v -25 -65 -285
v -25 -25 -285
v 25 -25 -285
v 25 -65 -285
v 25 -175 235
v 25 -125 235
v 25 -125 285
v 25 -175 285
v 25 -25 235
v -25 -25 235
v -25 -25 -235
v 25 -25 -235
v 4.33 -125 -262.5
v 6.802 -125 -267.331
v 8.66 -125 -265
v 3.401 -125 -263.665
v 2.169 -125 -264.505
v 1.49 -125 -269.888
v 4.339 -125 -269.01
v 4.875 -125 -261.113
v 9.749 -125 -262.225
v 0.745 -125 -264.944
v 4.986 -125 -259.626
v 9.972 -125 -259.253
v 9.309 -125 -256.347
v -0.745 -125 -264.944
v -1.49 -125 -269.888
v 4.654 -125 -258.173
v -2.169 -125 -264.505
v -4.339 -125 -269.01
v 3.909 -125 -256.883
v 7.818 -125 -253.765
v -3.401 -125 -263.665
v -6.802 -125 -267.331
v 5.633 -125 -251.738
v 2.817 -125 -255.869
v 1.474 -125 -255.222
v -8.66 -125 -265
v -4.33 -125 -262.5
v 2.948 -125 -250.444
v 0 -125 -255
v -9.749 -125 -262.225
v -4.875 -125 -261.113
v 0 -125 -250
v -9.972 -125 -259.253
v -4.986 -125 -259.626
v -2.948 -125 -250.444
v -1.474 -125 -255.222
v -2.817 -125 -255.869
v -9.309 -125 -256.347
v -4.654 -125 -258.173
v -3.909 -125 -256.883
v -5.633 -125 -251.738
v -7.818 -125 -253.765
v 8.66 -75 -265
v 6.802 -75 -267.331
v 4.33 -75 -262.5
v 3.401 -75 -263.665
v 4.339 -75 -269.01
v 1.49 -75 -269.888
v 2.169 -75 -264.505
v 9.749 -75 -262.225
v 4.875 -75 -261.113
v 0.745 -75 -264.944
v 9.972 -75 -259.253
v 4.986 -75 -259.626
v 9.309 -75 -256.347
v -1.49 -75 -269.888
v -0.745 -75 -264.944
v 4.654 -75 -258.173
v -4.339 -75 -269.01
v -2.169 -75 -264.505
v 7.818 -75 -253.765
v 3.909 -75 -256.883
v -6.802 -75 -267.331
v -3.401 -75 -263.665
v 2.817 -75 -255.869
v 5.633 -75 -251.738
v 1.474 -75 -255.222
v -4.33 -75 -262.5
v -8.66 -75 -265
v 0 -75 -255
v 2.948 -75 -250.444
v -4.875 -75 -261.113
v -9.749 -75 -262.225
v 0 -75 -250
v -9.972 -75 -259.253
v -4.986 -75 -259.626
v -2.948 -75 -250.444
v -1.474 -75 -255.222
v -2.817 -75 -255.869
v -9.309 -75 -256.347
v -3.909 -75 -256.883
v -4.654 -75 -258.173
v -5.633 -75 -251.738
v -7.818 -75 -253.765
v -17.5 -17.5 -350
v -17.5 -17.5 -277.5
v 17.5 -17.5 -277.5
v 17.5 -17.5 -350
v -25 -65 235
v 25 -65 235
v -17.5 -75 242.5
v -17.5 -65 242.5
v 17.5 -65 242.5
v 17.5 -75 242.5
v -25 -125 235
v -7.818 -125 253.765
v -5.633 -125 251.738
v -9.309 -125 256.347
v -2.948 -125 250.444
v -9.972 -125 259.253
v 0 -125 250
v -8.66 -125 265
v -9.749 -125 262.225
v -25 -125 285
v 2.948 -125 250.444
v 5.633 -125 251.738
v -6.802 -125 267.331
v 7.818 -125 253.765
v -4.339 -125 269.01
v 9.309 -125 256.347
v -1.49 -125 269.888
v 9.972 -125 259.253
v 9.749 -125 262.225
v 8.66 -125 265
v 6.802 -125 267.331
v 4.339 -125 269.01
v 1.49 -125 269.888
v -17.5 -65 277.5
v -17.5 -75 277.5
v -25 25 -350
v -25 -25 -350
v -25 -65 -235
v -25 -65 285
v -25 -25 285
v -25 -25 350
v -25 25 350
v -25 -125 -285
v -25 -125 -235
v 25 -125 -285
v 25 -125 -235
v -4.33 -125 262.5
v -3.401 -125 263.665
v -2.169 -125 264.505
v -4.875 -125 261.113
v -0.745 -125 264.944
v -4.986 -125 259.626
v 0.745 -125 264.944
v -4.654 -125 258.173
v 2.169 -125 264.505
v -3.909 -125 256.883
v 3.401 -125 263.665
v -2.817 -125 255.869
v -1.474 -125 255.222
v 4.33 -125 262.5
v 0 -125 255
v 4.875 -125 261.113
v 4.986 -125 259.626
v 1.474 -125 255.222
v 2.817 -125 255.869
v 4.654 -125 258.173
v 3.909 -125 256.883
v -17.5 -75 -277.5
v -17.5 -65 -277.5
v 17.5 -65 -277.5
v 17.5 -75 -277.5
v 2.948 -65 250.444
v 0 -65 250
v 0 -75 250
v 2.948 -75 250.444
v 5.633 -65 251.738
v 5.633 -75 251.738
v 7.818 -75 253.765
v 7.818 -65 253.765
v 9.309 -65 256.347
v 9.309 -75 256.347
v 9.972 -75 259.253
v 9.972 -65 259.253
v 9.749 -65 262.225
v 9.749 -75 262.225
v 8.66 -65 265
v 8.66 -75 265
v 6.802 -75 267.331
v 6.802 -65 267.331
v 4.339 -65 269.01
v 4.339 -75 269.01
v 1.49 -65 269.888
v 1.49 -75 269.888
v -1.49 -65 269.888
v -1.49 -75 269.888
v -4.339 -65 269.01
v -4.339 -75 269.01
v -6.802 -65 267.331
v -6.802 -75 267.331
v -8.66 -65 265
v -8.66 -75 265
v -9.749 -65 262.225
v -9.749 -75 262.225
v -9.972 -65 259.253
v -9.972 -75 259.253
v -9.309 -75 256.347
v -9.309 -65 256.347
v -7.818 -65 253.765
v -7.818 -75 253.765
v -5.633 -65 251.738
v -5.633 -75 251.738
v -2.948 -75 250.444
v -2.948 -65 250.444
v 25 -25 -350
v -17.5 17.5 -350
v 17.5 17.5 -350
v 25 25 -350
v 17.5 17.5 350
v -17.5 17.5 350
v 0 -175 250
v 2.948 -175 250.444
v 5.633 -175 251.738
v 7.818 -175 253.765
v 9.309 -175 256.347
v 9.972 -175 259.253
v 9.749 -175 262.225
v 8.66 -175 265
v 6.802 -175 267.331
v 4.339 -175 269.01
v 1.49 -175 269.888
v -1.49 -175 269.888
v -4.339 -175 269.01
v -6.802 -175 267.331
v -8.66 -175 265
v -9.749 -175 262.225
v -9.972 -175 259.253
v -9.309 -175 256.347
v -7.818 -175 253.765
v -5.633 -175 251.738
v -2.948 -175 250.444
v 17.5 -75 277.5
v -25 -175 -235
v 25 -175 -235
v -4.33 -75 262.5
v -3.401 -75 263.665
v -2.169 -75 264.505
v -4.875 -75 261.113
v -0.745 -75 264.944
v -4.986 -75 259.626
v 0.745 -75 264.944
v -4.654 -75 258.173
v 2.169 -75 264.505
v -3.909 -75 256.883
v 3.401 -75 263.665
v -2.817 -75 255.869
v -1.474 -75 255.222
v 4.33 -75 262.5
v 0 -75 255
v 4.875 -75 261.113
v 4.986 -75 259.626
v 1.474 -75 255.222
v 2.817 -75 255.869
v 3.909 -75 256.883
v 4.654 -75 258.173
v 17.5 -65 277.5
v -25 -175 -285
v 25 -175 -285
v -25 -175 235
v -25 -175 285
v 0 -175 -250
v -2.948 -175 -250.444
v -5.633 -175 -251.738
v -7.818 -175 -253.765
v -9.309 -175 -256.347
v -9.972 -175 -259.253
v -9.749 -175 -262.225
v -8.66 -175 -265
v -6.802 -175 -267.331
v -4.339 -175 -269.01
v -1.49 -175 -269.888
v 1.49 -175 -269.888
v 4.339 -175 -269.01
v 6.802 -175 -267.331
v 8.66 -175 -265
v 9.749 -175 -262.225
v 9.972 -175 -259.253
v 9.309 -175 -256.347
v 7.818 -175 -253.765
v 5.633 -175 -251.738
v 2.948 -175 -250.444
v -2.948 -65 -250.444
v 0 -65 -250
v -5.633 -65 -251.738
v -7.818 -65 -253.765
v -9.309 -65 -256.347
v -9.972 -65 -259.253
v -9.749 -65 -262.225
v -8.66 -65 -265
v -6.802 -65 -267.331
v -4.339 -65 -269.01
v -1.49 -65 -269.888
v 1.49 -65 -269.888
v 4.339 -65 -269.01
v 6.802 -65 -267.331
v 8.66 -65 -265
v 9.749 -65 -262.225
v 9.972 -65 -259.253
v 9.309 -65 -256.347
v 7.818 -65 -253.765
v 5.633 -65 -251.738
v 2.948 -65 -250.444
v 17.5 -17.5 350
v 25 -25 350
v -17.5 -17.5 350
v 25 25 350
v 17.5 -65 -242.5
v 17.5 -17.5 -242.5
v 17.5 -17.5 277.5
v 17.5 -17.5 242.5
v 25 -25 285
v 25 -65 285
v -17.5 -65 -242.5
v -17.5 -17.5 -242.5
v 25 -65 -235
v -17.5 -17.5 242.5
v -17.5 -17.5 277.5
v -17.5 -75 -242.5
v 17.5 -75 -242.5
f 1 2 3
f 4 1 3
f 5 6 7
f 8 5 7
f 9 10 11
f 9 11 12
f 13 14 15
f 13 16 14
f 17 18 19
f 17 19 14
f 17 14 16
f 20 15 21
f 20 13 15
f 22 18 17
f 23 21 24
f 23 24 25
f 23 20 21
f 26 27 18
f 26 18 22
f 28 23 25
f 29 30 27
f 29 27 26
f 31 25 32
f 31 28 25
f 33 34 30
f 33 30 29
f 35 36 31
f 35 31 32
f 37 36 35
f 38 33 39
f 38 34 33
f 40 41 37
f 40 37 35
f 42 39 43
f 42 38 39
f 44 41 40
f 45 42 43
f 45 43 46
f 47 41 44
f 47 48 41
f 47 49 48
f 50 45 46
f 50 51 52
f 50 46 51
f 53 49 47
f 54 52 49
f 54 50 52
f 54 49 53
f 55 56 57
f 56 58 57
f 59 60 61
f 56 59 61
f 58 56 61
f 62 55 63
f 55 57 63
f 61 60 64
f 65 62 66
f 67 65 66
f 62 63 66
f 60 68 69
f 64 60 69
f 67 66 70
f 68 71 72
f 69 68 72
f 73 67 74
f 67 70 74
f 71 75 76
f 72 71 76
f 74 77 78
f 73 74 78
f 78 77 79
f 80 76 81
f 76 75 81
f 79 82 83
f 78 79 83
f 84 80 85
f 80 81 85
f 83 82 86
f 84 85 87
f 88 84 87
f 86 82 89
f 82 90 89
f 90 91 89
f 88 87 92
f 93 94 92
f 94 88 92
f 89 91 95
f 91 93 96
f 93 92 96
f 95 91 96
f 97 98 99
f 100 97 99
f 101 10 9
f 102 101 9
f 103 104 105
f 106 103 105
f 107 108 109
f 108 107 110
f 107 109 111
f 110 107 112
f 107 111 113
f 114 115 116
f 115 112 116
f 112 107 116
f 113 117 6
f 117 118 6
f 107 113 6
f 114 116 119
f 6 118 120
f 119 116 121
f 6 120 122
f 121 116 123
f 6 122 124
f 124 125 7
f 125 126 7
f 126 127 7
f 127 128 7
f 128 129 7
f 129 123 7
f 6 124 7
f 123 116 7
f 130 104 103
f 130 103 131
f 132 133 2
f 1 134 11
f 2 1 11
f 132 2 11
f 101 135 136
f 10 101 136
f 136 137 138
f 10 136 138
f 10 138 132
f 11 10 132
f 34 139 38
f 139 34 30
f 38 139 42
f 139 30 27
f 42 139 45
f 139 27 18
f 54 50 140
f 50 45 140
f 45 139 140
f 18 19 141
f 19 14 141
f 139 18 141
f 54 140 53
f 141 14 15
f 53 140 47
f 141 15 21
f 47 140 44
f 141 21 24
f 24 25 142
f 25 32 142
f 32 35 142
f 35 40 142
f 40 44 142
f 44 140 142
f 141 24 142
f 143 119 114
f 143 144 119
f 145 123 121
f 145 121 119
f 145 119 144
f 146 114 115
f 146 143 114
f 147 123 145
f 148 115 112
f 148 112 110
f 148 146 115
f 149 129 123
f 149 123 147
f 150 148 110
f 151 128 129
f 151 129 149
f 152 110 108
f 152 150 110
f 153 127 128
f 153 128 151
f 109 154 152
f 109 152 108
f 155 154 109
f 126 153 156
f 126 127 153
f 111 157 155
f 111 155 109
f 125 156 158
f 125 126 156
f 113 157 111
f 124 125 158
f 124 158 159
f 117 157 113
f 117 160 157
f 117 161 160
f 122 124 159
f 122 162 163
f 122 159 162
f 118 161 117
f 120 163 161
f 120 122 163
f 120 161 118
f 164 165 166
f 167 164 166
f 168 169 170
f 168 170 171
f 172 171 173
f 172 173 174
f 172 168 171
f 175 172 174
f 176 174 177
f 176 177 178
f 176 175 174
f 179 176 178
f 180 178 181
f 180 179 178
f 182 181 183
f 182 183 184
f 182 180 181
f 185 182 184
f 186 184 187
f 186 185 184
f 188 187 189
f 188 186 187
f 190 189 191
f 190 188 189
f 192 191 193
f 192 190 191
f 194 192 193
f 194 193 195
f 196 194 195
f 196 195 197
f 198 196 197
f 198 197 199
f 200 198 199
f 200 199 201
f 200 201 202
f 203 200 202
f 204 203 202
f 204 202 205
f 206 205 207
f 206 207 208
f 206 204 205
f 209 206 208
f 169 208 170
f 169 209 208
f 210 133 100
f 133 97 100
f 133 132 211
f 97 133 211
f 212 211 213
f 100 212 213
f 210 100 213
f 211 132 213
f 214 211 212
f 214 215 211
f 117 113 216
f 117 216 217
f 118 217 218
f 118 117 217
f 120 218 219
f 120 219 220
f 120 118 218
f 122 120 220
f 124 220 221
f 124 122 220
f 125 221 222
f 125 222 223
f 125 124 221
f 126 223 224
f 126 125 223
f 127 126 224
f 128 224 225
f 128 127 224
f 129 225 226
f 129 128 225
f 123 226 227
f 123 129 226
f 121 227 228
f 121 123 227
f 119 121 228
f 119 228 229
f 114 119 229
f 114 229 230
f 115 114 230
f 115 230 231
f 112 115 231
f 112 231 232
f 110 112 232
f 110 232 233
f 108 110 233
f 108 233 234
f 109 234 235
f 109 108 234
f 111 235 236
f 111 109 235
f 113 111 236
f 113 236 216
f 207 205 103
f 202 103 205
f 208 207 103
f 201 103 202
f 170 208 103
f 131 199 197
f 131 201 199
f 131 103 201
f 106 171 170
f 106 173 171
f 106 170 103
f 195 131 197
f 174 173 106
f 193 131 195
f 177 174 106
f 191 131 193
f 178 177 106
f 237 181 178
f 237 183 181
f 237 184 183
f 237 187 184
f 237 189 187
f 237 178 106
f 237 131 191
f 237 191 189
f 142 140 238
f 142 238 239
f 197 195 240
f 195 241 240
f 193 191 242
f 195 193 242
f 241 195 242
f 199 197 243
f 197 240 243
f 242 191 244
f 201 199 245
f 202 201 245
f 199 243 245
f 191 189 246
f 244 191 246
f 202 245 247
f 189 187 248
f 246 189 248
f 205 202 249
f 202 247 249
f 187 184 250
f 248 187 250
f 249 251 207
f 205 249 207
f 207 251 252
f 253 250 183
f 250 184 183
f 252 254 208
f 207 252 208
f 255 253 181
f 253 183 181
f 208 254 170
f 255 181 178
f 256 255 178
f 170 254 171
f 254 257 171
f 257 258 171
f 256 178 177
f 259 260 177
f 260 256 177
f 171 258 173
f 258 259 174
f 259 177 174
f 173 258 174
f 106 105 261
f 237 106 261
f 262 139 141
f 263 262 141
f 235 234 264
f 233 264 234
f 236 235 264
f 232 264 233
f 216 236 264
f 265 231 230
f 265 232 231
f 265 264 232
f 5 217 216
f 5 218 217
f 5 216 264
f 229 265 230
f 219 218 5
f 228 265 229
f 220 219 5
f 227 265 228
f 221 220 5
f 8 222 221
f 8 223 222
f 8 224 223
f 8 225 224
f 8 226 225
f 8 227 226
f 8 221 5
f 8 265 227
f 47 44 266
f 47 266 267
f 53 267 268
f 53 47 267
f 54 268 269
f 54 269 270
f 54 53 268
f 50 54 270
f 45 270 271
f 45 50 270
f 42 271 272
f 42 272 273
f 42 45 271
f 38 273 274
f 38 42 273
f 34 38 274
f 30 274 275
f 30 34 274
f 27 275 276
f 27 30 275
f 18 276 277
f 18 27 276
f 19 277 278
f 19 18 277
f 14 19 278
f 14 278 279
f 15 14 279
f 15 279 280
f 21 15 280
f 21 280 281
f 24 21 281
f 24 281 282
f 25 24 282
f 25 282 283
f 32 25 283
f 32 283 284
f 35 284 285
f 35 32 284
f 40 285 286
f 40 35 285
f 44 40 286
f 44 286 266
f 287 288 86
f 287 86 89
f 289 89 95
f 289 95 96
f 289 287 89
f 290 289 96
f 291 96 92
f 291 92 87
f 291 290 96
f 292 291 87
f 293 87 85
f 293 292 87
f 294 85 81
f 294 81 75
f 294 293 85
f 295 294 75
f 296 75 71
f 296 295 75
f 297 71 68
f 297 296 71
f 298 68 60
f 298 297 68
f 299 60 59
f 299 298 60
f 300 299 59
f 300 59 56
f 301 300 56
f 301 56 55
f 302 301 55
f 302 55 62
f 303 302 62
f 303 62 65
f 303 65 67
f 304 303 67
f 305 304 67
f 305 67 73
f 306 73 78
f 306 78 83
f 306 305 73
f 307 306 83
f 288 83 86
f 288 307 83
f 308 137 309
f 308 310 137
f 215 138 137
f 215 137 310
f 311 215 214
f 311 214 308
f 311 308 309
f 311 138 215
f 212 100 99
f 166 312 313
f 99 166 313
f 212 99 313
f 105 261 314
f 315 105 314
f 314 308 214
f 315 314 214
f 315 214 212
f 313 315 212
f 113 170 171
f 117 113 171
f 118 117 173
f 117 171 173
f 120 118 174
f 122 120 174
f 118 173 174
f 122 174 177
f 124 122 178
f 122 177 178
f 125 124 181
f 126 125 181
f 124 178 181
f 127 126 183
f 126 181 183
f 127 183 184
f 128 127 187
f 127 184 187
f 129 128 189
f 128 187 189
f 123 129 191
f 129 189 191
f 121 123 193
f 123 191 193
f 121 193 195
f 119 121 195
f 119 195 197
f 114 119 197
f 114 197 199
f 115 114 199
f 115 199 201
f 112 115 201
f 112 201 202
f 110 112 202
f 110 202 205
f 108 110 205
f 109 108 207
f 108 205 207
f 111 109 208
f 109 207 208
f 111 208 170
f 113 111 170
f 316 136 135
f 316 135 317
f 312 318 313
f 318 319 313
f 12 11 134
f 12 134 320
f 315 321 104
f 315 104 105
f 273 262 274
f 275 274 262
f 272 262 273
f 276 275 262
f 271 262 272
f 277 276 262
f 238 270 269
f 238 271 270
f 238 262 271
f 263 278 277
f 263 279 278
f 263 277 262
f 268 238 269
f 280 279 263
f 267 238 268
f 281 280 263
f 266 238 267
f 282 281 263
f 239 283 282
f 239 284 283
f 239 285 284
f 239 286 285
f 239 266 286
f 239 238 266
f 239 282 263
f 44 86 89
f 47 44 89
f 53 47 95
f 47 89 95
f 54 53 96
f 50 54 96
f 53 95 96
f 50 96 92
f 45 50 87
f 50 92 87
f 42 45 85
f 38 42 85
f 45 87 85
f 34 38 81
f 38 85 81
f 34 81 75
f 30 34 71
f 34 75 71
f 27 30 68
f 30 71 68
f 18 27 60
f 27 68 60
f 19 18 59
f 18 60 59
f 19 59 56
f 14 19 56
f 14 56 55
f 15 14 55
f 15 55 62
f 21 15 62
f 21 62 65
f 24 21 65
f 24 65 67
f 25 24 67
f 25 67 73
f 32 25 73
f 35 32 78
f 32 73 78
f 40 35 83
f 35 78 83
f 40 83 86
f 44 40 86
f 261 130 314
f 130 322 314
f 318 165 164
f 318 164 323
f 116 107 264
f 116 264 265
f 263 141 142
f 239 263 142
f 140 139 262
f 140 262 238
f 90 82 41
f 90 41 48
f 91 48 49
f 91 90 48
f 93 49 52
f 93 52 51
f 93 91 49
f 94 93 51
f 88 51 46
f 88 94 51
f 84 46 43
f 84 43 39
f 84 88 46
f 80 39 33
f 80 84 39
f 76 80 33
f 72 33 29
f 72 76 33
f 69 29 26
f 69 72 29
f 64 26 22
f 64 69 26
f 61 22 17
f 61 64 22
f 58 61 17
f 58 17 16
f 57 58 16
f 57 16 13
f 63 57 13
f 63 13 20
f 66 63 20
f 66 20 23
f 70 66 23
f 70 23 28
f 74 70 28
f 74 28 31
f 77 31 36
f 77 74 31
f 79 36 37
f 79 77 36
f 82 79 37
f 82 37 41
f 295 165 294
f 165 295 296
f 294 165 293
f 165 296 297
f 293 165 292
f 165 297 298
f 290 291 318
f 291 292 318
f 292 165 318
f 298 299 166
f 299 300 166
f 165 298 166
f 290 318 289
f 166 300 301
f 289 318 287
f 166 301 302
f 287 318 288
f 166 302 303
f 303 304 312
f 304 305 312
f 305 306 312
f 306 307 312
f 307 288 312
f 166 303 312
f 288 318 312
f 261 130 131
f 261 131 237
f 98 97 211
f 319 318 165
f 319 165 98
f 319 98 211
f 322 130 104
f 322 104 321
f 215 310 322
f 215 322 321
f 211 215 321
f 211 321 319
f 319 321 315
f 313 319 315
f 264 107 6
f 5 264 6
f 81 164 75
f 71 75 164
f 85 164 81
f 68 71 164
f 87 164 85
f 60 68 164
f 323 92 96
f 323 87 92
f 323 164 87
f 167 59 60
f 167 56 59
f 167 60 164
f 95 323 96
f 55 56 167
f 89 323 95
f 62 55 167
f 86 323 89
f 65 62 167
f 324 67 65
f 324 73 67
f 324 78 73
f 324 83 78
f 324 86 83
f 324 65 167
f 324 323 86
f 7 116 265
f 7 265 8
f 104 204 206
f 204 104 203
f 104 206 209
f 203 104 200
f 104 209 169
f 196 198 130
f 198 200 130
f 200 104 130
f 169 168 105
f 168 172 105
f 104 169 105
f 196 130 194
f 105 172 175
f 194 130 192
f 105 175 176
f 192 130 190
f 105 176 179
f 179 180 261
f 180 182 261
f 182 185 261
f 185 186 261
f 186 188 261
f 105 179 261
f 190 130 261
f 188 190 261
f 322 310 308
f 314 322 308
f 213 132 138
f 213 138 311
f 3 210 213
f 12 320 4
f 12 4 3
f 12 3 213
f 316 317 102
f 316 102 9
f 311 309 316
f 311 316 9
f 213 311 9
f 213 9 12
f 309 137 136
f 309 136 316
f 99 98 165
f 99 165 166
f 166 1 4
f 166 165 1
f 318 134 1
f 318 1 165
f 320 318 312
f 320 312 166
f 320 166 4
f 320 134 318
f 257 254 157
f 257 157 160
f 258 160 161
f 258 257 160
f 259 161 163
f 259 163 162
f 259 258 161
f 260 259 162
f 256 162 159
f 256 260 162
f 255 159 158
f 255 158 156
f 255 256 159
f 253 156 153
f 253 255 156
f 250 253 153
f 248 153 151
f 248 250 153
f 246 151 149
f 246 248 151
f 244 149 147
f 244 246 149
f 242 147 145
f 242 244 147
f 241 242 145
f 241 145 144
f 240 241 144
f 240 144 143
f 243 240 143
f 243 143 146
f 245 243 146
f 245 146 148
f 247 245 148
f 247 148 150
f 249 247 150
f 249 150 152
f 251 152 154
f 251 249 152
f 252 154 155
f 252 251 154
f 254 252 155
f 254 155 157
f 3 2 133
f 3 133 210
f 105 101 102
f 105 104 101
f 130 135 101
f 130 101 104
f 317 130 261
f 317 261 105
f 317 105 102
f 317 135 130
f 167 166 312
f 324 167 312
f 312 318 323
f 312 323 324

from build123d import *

# Parameters (mm, degrees)
SKETCH_1_W          = 50
SKETCH_1_H          = 50
SKETCH_1_W_2        = 35
SKETCH_1_H_2        = 35
EXTRUDE_1_DEPTH     = 350
SKETCH_2_W          = 50
SKETCH_2_H          = 50
SKETCH_2_W_2        = 35
SKETCH_2_H_2        = 35
EXTRUDE_2_DEPTH     = 40
SKETCH_3_W          = 35
SKETCH_3_H          = 35
CUT_EXTRUDE_1_DEPTH = 70
SKETCH_4_W          = 35
SKETCH_4_H          = 35
SKETCH_4_R          = 10
EXTRUDE_3_DEPTH     = 10
EXTRUDE_3_2_DEPTH   = 10
SKETCH_5_R          = 10
SKETCH_5_R_2        = 5
EXTRUDE_4_DEPTH     = 50
EXTRUDE_4_2_DEPTH   = 50
SKETCH_6_W          = 50
SKETCH_6_H          = 50
SKETCH_6_R          = 10
EXTRUDE_5_DEPTH     = 50
EXTRUDE_5_2_DEPTH   = 50


with BuildPart() as part:
    # Эскиз1 → Бобышка-Вытянуть1 (new, symmetric)
    with BuildSketch(Plane.XY):
        Rectangle(SKETCH_1_W, SKETCH_1_H)
        Rectangle(SKETCH_1_W_2, SKETCH_1_H_2, mode=Mode.SUBTRACT)
    extrude(amount=EXTRUDE_1_DEPTH, both=True)

    # Эскиз2 → Бобышка-Вытянуть2 (add)
    # profile 1 of 2: a face of its own
    with BuildSketch(Plane.XZ.offset(25)):
        with Locations((0, -260)):
            Rectangle(SKETCH_2_W, SKETCH_2_H)
        with Locations((0, -260)):
            Rectangle(SKETCH_2_W_2, SKETCH_2_H_2, mode=Mode.SUBTRACT)
    # profile 2 of 2: a face of its own
    with BuildSketch(Plane.XZ.offset(25)):
        with Locations((0, 260)):
            Rectangle(SKETCH_2_W, SKETCH_2_H)
        with Locations((0, 260)):
            Rectangle(SKETCH_2_W_2, SKETCH_2_H_2, mode=Mode.SUBTRACT)
    extrude(amount=EXTRUDE_2_DEPTH)

    # Эскиз3 → Вырез-Вытянуть1 (cut)
    with BuildSketch(Plane.XZ.offset(65)):
        with Locations((0, 260)):
            Rectangle(SKETCH_3_W, SKETCH_3_H)
        with Locations((0, -260)):
            Rectangle(SKETCH_3_W, SKETCH_3_H)
    extrude(amount=-CUT_EXTRUDE_1_DEPTH, mode=Mode.SUBTRACT)


with BuildPart() as body_2:
    # Эскиз4 → Бобышка-Вытянуть3 (new body)
    with BuildSketch(Plane.XZ.offset(65)):
        with Locations((0, 260)):
            Rectangle(SKETCH_4_W, SKETCH_4_H)
        with Locations(Location((0, 260, 0), (0, 0, 270))):
            Circle(SKETCH_4_R, mode=Mode.SUBTRACT)
    extrude(amount=EXTRUDE_3_DEPTH)


with BuildPart() as body_3:
    # Эскиз4 → Extrude 3 2 (new body)
    with BuildSketch(Plane.XZ.offset(65)):
        with Locations((0, -260)):
            Rectangle(SKETCH_4_W, SKETCH_4_H)
        with Locations(Location((0, -260, 0), (0, 0, 90))):
            Circle(SKETCH_4_R, mode=Mode.SUBTRACT)
    extrude(amount=EXTRUDE_3_2_DEPTH)


with BuildPart() as body_4:
    # Эскиз5 → Бобышка-Вытянуть4 (new body)
    with BuildSketch(Plane.XZ.offset(75)):
        with Locations(Location((0, 260, 0), (0, 0, 270))):
            Circle(SKETCH_5_R)
        with Locations(Location((0, 260, 0), (0, 0, 270))):
            Circle(SKETCH_5_R_2, mode=Mode.SUBTRACT)
    extrude(amount=EXTRUDE_4_DEPTH)


with BuildPart() as body_5:
    # Эскиз5 → Extrude 4 2 (new body)
    with BuildSketch(Plane.XZ.offset(75)):
        with Locations(Location((0, -260, 0), (0, 0, 90))):
            Circle(SKETCH_5_R)
        with Locations(Location((0, -260, 0), (0, 0, 90))):
            Circle(SKETCH_5_R_2, mode=Mode.SUBTRACT)
    extrude(amount=EXTRUDE_4_2_DEPTH)


with BuildPart() as body_6:
    # Эскиз6 → Бобышка-Вытянуть5 (new body)
    with BuildSketch(Plane.XZ.offset(125)):
        with Locations((0, 260)):
            Rectangle(SKETCH_6_W, SKETCH_6_H)
        with Locations(Location((0, 260, 0), (0, 0, 270))):
            Circle(SKETCH_6_R, mode=Mode.SUBTRACT)
    extrude(amount=EXTRUDE_5_DEPTH)


with BuildPart() as body_7:
    # Эскиз6 → Extrude 5 2 (new body)
    with BuildSketch(Plane.XZ.offset(125)):
        with Locations((0, -260)):
            Rectangle(SKETCH_6_W, SKETCH_6_H)
        with Locations(Location((0, -260, 0), (0, 0, 90))):
            Circle(SKETCH_6_R, mode=Mode.SUBTRACT)
    extrude(amount=EXTRUDE_5_2_DEPTH)


solid = Compound([part.part, body_2.part, body_3.part, body_4.part, body_5.part, body_6.part, body_7.part])
